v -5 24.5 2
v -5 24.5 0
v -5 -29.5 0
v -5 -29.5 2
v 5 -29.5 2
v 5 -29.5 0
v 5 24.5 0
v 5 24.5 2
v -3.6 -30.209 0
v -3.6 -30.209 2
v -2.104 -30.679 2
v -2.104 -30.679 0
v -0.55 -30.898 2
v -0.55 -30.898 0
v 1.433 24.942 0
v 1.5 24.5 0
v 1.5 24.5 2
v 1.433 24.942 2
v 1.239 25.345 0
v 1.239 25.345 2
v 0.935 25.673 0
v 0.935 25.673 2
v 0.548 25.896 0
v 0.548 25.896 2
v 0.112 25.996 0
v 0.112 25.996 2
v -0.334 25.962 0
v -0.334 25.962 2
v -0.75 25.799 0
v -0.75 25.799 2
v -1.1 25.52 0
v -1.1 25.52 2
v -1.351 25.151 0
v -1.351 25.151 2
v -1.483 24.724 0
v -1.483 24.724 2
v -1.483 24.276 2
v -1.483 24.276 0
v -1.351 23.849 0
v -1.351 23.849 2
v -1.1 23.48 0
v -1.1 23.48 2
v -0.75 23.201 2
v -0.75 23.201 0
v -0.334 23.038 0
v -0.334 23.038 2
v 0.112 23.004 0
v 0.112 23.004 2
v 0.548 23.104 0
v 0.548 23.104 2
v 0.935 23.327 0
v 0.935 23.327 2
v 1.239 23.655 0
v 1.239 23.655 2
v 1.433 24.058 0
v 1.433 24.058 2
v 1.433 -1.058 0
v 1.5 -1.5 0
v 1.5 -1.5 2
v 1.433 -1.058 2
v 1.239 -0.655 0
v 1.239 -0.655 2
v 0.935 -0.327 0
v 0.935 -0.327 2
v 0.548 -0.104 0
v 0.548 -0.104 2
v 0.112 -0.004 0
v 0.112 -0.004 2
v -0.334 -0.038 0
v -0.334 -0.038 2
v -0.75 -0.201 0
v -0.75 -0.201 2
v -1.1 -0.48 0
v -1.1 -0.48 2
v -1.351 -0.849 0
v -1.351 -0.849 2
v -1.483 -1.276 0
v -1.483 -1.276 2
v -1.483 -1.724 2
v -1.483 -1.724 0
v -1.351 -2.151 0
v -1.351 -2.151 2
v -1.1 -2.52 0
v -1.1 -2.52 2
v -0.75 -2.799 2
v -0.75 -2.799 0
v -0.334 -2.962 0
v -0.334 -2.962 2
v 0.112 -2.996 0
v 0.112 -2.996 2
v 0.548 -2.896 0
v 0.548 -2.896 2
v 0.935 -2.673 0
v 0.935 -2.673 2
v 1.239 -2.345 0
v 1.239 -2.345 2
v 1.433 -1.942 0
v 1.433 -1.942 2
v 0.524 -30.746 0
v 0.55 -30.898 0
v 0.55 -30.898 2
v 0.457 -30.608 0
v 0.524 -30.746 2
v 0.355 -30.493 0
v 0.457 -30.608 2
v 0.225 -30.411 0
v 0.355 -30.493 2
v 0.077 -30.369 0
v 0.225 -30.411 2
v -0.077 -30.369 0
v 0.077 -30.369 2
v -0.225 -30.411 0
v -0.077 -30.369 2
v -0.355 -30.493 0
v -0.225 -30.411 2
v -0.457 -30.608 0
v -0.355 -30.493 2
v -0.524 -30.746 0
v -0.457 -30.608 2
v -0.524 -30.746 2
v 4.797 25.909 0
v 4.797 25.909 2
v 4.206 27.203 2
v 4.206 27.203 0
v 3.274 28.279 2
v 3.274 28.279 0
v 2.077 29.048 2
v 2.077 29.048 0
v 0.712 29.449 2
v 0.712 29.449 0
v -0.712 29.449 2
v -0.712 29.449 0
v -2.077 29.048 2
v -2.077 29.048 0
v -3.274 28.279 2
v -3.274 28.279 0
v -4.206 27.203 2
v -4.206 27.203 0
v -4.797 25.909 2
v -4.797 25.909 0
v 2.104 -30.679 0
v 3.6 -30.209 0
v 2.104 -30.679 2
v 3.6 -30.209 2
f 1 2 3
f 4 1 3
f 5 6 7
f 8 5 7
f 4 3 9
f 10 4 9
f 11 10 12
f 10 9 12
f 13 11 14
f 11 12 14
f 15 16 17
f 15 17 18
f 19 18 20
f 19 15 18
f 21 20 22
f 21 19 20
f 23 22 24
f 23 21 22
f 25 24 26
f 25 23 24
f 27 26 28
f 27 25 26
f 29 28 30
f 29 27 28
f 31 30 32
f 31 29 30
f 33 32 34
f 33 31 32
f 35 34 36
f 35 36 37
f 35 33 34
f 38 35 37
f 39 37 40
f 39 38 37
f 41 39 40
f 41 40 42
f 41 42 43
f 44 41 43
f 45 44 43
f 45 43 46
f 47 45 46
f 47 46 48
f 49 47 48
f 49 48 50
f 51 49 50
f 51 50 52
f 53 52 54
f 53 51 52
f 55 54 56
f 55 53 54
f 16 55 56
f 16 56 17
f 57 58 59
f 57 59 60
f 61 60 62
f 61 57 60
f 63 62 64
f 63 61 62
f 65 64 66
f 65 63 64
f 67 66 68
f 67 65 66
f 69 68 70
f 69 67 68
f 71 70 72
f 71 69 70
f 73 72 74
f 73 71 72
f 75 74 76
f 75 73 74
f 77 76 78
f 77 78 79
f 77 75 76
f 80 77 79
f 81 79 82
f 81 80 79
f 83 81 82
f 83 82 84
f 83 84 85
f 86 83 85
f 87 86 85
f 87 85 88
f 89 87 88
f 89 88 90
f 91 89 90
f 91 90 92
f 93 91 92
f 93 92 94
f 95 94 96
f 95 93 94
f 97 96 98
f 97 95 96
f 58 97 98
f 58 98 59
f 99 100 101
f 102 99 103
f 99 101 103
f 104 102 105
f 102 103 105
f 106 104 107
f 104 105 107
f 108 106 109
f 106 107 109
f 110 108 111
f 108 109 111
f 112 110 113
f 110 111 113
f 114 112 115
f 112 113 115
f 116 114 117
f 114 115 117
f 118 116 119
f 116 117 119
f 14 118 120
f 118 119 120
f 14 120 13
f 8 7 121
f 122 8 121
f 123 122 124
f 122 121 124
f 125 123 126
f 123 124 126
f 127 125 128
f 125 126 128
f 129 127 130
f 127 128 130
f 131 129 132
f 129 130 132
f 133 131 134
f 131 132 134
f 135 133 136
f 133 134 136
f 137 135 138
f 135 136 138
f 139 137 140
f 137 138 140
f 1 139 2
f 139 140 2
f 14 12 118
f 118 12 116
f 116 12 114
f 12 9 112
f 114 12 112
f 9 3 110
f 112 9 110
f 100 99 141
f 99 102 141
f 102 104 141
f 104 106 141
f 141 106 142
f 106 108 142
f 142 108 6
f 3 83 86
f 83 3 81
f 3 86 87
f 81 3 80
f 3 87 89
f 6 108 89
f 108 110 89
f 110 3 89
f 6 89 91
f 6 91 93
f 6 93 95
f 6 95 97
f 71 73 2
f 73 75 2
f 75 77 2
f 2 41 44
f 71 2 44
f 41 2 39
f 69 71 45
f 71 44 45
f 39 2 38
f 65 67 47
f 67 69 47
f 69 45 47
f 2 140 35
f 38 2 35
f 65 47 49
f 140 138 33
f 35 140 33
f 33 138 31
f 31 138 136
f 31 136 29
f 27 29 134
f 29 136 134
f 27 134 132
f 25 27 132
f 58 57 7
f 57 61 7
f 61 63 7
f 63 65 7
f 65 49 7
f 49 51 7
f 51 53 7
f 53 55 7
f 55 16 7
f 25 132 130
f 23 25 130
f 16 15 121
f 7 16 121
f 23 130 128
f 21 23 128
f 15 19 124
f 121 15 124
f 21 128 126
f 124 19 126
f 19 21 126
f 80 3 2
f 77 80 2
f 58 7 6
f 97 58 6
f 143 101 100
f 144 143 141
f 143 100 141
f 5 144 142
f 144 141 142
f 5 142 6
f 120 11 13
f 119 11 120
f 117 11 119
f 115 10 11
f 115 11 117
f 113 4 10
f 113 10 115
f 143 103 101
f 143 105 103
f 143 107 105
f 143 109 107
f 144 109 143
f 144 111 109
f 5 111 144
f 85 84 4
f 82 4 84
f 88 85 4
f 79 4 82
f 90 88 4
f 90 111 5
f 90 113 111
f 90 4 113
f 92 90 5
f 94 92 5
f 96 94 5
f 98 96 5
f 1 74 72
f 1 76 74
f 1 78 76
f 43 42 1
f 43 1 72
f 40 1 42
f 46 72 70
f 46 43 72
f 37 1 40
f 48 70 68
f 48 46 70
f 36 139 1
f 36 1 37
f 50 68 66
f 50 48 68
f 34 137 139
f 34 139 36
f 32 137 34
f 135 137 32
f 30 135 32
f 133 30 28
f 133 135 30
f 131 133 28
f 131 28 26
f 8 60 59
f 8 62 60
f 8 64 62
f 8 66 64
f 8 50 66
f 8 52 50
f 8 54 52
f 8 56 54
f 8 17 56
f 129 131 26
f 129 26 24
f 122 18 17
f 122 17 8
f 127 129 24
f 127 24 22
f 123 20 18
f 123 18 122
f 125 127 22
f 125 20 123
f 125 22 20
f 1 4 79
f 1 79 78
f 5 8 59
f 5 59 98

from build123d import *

# Parameters (mm, degrees)
SKETCH1_R           = 1.5
BOSS_EXTRUDE1_DEPTH = 2
SKETCH2_R           = 0.550401242
CUT_EXTRUDE1_DEPTH  = 10


with BuildPart() as part:
    # Sketch1 → Boss-Extrude1 (new body)
    with BuildSketch(Plane.XY):
        with BuildLine():
            Line((-5, 24.5), (-5, -29.5))
            ThreePointArc((-5, -29.5), (0, -30.913706536), (5, -29.5))
            Line((5, -29.5), (5, 24.5))
            ThreePointArc((5, 24.5), (0, 29.5), (-5, 24.5))
        make_face()
        with Locations((0, 24.5)):
            Circle(SKETCH1_R, mode=Mode.SUBTRACT)
        with Locations((0, -1.5)):
            Circle(SKETCH1_R, mode=Mode.SUBTRACT)
    extrude(amount=BOSS_EXTRUDE1_DEPTH)

    # Sketch2 → Cut-Extrude1 (cut)
    with BuildSketch(Plane.XY.offset(2)):
        with Locations((0, -30.913706536)):
            Circle(SKETCH2_R)
    extrude(amount=-CUT_EXTRUDE1_DEPTH, mode=Mode.SUBTRACT)


solid = part.part
